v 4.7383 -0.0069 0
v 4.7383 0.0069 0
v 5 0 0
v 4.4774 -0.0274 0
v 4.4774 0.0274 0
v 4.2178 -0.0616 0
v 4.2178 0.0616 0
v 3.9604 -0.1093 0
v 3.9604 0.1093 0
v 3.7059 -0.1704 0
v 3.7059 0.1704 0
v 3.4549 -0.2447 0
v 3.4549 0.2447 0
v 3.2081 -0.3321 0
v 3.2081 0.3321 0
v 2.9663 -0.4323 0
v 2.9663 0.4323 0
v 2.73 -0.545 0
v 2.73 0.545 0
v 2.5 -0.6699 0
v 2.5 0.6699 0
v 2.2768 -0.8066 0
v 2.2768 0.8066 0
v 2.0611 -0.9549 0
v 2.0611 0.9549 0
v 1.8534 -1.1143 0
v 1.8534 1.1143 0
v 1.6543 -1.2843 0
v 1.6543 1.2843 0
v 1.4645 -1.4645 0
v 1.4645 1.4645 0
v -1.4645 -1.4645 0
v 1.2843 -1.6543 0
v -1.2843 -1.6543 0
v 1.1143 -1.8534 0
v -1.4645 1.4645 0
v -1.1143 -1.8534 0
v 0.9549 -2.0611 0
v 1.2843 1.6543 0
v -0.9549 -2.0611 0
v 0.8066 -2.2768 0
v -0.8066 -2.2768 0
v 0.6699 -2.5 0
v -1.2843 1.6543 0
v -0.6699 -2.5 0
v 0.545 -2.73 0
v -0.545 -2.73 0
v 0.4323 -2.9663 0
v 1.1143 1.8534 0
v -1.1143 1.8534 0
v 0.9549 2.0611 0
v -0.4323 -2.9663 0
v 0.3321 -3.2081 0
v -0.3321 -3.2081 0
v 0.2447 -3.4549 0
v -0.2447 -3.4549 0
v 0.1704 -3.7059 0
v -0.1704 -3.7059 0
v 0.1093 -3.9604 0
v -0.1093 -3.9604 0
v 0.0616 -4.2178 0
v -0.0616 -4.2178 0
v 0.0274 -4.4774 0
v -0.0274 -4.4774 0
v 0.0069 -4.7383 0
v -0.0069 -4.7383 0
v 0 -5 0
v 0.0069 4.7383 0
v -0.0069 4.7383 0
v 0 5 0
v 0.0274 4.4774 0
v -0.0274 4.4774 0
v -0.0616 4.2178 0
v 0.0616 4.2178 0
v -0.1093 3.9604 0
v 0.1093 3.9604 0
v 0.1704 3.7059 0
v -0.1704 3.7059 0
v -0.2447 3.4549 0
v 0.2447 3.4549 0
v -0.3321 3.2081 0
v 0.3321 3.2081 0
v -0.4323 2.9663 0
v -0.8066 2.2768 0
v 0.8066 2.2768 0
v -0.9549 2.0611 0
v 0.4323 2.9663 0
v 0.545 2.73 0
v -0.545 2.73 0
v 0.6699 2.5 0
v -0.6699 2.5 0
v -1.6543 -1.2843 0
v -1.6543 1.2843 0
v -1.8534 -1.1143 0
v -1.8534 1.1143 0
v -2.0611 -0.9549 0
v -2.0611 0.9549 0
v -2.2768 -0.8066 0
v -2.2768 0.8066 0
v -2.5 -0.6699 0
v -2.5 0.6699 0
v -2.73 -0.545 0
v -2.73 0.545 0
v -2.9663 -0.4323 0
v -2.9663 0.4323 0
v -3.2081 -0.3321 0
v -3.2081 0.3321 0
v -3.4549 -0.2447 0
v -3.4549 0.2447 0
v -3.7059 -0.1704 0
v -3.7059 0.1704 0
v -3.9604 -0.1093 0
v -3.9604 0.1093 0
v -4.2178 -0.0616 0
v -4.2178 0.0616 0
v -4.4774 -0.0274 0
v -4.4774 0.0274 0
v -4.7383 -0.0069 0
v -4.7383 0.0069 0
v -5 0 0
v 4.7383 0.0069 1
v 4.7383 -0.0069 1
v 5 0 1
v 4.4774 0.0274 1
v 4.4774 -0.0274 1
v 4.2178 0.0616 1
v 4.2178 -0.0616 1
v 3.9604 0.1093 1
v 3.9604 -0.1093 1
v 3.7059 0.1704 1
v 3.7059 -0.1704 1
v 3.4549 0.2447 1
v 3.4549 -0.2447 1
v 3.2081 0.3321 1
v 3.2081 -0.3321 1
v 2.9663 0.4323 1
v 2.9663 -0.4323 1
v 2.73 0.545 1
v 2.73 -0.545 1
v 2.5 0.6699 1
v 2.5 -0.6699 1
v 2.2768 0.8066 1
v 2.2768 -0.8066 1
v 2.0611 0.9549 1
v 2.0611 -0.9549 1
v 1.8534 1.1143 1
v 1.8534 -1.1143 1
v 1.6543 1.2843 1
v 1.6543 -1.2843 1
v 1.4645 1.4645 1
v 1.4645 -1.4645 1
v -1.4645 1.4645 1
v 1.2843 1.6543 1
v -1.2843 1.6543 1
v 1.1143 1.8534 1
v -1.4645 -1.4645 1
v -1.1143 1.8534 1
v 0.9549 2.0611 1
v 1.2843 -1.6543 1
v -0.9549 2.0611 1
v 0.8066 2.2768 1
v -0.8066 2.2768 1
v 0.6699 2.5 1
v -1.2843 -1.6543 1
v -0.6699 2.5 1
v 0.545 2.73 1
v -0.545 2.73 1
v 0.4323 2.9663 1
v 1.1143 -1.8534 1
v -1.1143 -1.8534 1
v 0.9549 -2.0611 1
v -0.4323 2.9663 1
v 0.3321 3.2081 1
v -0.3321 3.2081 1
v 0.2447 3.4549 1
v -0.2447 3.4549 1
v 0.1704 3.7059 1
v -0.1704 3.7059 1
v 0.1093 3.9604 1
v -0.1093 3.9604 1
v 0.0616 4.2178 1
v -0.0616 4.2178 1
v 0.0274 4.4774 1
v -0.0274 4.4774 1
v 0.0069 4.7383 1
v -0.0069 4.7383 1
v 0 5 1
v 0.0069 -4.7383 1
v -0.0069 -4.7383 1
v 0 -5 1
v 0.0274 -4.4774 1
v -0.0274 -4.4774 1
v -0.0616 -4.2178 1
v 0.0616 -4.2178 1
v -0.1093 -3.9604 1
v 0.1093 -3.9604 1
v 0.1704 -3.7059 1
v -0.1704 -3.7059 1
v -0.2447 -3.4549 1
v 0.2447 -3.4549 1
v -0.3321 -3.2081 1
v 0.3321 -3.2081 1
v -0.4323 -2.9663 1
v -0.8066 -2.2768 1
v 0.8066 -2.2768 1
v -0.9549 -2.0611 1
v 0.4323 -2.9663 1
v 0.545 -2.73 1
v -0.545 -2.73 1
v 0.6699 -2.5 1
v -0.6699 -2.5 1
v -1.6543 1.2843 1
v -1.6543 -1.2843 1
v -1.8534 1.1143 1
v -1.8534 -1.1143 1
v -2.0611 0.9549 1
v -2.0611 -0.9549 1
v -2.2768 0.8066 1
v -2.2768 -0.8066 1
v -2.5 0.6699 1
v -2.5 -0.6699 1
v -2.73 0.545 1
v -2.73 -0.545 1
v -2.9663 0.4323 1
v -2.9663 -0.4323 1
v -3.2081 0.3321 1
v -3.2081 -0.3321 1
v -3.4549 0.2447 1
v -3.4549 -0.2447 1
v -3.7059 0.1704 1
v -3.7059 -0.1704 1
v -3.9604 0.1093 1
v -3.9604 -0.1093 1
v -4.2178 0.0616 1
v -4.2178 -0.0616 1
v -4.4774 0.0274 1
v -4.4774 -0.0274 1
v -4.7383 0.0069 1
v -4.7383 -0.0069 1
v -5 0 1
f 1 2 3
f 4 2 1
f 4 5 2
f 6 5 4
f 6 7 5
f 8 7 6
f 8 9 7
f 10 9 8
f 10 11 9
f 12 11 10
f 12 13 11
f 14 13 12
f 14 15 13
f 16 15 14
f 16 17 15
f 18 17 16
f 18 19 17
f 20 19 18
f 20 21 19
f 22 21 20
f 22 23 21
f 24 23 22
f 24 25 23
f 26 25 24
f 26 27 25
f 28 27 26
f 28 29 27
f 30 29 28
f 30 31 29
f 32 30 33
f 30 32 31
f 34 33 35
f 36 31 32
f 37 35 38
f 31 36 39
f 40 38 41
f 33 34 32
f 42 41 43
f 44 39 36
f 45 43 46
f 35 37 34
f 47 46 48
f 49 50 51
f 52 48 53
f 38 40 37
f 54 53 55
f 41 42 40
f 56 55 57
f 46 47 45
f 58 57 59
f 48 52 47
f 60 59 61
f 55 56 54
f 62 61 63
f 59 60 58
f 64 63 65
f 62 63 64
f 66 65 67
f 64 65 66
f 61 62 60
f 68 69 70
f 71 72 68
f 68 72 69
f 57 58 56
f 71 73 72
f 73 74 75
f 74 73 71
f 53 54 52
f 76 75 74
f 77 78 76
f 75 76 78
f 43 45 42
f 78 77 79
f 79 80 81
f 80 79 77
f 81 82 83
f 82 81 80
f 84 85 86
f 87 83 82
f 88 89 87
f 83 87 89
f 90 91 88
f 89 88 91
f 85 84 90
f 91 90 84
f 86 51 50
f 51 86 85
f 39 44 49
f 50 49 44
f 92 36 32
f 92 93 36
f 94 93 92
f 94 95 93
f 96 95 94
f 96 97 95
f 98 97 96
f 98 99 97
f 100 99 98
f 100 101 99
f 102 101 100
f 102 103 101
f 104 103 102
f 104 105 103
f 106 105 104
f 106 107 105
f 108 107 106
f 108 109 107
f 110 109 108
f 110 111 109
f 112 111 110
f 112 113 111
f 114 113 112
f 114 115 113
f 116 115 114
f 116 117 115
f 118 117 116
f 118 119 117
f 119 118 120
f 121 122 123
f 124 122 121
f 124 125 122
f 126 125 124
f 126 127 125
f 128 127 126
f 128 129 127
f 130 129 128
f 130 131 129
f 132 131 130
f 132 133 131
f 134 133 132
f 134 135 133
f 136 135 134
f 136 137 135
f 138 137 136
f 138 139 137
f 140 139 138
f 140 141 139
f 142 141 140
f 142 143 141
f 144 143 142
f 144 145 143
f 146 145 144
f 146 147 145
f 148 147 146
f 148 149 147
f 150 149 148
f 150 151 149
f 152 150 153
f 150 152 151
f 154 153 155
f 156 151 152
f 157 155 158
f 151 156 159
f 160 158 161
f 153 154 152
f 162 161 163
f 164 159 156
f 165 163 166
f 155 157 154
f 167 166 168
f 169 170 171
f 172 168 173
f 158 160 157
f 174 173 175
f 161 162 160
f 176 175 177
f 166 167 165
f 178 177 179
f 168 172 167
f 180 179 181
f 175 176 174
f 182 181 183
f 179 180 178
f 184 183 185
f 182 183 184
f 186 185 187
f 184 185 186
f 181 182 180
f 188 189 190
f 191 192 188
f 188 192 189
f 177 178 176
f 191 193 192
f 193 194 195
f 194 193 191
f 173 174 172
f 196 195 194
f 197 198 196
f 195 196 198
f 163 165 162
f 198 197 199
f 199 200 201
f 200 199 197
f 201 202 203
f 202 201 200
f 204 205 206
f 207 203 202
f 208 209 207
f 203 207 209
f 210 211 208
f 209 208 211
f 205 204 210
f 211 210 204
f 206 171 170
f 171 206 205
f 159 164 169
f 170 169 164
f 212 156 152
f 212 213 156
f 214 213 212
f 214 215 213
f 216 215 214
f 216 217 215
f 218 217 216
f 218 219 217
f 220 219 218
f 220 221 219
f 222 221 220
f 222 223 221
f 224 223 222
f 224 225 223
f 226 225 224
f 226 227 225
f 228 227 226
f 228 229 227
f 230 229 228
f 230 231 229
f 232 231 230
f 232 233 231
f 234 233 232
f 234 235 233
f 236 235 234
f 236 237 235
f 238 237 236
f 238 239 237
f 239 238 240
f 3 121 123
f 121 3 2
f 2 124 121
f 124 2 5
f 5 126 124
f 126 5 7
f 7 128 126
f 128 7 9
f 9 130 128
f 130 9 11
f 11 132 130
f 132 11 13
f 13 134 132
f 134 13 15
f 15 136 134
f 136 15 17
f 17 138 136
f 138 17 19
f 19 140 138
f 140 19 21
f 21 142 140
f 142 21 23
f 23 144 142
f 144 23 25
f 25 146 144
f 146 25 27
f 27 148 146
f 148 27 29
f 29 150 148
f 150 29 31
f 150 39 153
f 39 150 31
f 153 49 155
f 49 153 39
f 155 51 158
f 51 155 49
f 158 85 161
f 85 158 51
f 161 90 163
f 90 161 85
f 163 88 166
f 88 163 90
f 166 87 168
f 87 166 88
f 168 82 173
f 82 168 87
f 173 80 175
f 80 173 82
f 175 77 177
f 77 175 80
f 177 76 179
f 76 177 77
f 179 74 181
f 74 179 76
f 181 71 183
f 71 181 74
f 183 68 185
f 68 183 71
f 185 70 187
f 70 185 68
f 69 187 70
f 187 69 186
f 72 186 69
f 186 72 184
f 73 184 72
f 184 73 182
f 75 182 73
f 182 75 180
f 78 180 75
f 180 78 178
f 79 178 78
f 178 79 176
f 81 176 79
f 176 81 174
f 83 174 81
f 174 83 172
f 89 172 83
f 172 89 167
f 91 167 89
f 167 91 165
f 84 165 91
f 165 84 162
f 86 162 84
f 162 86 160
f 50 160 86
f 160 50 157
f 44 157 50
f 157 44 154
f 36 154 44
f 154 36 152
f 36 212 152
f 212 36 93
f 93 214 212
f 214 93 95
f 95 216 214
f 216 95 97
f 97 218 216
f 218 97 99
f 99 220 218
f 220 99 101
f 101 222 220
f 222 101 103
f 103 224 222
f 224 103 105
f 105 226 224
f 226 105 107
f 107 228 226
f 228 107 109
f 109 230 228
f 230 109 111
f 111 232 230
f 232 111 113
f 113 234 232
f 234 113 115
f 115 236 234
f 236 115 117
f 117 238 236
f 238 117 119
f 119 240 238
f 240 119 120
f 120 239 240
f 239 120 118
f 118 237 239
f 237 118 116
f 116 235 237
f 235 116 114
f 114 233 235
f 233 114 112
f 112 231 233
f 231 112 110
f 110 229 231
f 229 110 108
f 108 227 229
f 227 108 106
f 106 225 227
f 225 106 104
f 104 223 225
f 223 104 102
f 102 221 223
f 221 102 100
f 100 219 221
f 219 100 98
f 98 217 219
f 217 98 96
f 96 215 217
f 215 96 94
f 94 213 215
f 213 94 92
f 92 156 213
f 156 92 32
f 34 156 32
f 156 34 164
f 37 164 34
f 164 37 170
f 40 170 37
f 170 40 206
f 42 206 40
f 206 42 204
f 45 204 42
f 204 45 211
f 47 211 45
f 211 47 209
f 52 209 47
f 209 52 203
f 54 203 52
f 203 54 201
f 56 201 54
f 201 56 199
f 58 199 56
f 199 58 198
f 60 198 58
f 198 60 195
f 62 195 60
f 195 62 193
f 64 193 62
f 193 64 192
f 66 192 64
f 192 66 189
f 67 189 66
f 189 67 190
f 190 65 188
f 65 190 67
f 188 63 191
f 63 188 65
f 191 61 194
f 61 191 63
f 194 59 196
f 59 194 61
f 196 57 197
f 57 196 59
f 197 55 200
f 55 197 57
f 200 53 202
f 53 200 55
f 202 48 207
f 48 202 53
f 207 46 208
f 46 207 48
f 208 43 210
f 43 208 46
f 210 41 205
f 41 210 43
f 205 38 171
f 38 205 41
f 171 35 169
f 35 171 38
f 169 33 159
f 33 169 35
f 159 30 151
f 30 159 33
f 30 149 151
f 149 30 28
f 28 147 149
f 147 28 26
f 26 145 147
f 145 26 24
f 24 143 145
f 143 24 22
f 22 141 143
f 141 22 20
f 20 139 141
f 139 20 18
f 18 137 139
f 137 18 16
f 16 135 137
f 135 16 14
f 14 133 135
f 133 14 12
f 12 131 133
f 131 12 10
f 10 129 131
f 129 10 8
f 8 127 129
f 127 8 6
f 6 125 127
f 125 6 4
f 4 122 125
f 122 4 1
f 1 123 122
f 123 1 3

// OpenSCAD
$fn = 120;
color("red") {
  linear_extrude(1) {
    difference() {
      square([10, 10]);
      translate([5, 5]) {
        circle(r=5);
      }
      translate([5, 0]) {
        square([5, 5]);
      }
      translate([5, 5]) {
        square([5, 5]);
      }
      translate([0, 5]) {
        square([5, 5]);
      }
    }
  }
}
color("blue") {
  linear_extrude(1) {
    rotate(90, [0, 0, 1]) {
      difference() {
        square([10, 10]);
        translate([5, 5]) {
          circle(r=5);
        }
        translate([5, 0]) {
          square([5, 5]);
        }
        translate([5, 5]) {
          square([5, 5]);
        }
        translate([0, 5]) {
          square([5, 5]);
        }
      }
    }
  }
}
color("yellow") {
  linear_extrude(1) {
    rotate(180, [0, 0, 1]) {
      difference() {
        square([10, 10]);
        translate([5, 5]) {
          circle(r=5);
        }
        translate([5, 0]) {
          square([5, 5]);
        }
        translate([5, 5]) {
          square([5, 5]);
        }
        translate([0, 5]) {
          square([5, 5]);
        }
      }
    }
  }
}
color("green") {
  linear_extrude(1) {
    rotate(270, [0, 0, 1]) {
      difference() {
        square([10, 10]);
        translate([5, 5]) {
          circle(r=5);
        }
        translate([5, 0]) {
          square([5, 5]);
        }
        translate([5, 5]) {
          square([5, 5]);
        }
        translate([0, 5]) {
          square([5, 5]);
        }
      }
    }
  }
}
